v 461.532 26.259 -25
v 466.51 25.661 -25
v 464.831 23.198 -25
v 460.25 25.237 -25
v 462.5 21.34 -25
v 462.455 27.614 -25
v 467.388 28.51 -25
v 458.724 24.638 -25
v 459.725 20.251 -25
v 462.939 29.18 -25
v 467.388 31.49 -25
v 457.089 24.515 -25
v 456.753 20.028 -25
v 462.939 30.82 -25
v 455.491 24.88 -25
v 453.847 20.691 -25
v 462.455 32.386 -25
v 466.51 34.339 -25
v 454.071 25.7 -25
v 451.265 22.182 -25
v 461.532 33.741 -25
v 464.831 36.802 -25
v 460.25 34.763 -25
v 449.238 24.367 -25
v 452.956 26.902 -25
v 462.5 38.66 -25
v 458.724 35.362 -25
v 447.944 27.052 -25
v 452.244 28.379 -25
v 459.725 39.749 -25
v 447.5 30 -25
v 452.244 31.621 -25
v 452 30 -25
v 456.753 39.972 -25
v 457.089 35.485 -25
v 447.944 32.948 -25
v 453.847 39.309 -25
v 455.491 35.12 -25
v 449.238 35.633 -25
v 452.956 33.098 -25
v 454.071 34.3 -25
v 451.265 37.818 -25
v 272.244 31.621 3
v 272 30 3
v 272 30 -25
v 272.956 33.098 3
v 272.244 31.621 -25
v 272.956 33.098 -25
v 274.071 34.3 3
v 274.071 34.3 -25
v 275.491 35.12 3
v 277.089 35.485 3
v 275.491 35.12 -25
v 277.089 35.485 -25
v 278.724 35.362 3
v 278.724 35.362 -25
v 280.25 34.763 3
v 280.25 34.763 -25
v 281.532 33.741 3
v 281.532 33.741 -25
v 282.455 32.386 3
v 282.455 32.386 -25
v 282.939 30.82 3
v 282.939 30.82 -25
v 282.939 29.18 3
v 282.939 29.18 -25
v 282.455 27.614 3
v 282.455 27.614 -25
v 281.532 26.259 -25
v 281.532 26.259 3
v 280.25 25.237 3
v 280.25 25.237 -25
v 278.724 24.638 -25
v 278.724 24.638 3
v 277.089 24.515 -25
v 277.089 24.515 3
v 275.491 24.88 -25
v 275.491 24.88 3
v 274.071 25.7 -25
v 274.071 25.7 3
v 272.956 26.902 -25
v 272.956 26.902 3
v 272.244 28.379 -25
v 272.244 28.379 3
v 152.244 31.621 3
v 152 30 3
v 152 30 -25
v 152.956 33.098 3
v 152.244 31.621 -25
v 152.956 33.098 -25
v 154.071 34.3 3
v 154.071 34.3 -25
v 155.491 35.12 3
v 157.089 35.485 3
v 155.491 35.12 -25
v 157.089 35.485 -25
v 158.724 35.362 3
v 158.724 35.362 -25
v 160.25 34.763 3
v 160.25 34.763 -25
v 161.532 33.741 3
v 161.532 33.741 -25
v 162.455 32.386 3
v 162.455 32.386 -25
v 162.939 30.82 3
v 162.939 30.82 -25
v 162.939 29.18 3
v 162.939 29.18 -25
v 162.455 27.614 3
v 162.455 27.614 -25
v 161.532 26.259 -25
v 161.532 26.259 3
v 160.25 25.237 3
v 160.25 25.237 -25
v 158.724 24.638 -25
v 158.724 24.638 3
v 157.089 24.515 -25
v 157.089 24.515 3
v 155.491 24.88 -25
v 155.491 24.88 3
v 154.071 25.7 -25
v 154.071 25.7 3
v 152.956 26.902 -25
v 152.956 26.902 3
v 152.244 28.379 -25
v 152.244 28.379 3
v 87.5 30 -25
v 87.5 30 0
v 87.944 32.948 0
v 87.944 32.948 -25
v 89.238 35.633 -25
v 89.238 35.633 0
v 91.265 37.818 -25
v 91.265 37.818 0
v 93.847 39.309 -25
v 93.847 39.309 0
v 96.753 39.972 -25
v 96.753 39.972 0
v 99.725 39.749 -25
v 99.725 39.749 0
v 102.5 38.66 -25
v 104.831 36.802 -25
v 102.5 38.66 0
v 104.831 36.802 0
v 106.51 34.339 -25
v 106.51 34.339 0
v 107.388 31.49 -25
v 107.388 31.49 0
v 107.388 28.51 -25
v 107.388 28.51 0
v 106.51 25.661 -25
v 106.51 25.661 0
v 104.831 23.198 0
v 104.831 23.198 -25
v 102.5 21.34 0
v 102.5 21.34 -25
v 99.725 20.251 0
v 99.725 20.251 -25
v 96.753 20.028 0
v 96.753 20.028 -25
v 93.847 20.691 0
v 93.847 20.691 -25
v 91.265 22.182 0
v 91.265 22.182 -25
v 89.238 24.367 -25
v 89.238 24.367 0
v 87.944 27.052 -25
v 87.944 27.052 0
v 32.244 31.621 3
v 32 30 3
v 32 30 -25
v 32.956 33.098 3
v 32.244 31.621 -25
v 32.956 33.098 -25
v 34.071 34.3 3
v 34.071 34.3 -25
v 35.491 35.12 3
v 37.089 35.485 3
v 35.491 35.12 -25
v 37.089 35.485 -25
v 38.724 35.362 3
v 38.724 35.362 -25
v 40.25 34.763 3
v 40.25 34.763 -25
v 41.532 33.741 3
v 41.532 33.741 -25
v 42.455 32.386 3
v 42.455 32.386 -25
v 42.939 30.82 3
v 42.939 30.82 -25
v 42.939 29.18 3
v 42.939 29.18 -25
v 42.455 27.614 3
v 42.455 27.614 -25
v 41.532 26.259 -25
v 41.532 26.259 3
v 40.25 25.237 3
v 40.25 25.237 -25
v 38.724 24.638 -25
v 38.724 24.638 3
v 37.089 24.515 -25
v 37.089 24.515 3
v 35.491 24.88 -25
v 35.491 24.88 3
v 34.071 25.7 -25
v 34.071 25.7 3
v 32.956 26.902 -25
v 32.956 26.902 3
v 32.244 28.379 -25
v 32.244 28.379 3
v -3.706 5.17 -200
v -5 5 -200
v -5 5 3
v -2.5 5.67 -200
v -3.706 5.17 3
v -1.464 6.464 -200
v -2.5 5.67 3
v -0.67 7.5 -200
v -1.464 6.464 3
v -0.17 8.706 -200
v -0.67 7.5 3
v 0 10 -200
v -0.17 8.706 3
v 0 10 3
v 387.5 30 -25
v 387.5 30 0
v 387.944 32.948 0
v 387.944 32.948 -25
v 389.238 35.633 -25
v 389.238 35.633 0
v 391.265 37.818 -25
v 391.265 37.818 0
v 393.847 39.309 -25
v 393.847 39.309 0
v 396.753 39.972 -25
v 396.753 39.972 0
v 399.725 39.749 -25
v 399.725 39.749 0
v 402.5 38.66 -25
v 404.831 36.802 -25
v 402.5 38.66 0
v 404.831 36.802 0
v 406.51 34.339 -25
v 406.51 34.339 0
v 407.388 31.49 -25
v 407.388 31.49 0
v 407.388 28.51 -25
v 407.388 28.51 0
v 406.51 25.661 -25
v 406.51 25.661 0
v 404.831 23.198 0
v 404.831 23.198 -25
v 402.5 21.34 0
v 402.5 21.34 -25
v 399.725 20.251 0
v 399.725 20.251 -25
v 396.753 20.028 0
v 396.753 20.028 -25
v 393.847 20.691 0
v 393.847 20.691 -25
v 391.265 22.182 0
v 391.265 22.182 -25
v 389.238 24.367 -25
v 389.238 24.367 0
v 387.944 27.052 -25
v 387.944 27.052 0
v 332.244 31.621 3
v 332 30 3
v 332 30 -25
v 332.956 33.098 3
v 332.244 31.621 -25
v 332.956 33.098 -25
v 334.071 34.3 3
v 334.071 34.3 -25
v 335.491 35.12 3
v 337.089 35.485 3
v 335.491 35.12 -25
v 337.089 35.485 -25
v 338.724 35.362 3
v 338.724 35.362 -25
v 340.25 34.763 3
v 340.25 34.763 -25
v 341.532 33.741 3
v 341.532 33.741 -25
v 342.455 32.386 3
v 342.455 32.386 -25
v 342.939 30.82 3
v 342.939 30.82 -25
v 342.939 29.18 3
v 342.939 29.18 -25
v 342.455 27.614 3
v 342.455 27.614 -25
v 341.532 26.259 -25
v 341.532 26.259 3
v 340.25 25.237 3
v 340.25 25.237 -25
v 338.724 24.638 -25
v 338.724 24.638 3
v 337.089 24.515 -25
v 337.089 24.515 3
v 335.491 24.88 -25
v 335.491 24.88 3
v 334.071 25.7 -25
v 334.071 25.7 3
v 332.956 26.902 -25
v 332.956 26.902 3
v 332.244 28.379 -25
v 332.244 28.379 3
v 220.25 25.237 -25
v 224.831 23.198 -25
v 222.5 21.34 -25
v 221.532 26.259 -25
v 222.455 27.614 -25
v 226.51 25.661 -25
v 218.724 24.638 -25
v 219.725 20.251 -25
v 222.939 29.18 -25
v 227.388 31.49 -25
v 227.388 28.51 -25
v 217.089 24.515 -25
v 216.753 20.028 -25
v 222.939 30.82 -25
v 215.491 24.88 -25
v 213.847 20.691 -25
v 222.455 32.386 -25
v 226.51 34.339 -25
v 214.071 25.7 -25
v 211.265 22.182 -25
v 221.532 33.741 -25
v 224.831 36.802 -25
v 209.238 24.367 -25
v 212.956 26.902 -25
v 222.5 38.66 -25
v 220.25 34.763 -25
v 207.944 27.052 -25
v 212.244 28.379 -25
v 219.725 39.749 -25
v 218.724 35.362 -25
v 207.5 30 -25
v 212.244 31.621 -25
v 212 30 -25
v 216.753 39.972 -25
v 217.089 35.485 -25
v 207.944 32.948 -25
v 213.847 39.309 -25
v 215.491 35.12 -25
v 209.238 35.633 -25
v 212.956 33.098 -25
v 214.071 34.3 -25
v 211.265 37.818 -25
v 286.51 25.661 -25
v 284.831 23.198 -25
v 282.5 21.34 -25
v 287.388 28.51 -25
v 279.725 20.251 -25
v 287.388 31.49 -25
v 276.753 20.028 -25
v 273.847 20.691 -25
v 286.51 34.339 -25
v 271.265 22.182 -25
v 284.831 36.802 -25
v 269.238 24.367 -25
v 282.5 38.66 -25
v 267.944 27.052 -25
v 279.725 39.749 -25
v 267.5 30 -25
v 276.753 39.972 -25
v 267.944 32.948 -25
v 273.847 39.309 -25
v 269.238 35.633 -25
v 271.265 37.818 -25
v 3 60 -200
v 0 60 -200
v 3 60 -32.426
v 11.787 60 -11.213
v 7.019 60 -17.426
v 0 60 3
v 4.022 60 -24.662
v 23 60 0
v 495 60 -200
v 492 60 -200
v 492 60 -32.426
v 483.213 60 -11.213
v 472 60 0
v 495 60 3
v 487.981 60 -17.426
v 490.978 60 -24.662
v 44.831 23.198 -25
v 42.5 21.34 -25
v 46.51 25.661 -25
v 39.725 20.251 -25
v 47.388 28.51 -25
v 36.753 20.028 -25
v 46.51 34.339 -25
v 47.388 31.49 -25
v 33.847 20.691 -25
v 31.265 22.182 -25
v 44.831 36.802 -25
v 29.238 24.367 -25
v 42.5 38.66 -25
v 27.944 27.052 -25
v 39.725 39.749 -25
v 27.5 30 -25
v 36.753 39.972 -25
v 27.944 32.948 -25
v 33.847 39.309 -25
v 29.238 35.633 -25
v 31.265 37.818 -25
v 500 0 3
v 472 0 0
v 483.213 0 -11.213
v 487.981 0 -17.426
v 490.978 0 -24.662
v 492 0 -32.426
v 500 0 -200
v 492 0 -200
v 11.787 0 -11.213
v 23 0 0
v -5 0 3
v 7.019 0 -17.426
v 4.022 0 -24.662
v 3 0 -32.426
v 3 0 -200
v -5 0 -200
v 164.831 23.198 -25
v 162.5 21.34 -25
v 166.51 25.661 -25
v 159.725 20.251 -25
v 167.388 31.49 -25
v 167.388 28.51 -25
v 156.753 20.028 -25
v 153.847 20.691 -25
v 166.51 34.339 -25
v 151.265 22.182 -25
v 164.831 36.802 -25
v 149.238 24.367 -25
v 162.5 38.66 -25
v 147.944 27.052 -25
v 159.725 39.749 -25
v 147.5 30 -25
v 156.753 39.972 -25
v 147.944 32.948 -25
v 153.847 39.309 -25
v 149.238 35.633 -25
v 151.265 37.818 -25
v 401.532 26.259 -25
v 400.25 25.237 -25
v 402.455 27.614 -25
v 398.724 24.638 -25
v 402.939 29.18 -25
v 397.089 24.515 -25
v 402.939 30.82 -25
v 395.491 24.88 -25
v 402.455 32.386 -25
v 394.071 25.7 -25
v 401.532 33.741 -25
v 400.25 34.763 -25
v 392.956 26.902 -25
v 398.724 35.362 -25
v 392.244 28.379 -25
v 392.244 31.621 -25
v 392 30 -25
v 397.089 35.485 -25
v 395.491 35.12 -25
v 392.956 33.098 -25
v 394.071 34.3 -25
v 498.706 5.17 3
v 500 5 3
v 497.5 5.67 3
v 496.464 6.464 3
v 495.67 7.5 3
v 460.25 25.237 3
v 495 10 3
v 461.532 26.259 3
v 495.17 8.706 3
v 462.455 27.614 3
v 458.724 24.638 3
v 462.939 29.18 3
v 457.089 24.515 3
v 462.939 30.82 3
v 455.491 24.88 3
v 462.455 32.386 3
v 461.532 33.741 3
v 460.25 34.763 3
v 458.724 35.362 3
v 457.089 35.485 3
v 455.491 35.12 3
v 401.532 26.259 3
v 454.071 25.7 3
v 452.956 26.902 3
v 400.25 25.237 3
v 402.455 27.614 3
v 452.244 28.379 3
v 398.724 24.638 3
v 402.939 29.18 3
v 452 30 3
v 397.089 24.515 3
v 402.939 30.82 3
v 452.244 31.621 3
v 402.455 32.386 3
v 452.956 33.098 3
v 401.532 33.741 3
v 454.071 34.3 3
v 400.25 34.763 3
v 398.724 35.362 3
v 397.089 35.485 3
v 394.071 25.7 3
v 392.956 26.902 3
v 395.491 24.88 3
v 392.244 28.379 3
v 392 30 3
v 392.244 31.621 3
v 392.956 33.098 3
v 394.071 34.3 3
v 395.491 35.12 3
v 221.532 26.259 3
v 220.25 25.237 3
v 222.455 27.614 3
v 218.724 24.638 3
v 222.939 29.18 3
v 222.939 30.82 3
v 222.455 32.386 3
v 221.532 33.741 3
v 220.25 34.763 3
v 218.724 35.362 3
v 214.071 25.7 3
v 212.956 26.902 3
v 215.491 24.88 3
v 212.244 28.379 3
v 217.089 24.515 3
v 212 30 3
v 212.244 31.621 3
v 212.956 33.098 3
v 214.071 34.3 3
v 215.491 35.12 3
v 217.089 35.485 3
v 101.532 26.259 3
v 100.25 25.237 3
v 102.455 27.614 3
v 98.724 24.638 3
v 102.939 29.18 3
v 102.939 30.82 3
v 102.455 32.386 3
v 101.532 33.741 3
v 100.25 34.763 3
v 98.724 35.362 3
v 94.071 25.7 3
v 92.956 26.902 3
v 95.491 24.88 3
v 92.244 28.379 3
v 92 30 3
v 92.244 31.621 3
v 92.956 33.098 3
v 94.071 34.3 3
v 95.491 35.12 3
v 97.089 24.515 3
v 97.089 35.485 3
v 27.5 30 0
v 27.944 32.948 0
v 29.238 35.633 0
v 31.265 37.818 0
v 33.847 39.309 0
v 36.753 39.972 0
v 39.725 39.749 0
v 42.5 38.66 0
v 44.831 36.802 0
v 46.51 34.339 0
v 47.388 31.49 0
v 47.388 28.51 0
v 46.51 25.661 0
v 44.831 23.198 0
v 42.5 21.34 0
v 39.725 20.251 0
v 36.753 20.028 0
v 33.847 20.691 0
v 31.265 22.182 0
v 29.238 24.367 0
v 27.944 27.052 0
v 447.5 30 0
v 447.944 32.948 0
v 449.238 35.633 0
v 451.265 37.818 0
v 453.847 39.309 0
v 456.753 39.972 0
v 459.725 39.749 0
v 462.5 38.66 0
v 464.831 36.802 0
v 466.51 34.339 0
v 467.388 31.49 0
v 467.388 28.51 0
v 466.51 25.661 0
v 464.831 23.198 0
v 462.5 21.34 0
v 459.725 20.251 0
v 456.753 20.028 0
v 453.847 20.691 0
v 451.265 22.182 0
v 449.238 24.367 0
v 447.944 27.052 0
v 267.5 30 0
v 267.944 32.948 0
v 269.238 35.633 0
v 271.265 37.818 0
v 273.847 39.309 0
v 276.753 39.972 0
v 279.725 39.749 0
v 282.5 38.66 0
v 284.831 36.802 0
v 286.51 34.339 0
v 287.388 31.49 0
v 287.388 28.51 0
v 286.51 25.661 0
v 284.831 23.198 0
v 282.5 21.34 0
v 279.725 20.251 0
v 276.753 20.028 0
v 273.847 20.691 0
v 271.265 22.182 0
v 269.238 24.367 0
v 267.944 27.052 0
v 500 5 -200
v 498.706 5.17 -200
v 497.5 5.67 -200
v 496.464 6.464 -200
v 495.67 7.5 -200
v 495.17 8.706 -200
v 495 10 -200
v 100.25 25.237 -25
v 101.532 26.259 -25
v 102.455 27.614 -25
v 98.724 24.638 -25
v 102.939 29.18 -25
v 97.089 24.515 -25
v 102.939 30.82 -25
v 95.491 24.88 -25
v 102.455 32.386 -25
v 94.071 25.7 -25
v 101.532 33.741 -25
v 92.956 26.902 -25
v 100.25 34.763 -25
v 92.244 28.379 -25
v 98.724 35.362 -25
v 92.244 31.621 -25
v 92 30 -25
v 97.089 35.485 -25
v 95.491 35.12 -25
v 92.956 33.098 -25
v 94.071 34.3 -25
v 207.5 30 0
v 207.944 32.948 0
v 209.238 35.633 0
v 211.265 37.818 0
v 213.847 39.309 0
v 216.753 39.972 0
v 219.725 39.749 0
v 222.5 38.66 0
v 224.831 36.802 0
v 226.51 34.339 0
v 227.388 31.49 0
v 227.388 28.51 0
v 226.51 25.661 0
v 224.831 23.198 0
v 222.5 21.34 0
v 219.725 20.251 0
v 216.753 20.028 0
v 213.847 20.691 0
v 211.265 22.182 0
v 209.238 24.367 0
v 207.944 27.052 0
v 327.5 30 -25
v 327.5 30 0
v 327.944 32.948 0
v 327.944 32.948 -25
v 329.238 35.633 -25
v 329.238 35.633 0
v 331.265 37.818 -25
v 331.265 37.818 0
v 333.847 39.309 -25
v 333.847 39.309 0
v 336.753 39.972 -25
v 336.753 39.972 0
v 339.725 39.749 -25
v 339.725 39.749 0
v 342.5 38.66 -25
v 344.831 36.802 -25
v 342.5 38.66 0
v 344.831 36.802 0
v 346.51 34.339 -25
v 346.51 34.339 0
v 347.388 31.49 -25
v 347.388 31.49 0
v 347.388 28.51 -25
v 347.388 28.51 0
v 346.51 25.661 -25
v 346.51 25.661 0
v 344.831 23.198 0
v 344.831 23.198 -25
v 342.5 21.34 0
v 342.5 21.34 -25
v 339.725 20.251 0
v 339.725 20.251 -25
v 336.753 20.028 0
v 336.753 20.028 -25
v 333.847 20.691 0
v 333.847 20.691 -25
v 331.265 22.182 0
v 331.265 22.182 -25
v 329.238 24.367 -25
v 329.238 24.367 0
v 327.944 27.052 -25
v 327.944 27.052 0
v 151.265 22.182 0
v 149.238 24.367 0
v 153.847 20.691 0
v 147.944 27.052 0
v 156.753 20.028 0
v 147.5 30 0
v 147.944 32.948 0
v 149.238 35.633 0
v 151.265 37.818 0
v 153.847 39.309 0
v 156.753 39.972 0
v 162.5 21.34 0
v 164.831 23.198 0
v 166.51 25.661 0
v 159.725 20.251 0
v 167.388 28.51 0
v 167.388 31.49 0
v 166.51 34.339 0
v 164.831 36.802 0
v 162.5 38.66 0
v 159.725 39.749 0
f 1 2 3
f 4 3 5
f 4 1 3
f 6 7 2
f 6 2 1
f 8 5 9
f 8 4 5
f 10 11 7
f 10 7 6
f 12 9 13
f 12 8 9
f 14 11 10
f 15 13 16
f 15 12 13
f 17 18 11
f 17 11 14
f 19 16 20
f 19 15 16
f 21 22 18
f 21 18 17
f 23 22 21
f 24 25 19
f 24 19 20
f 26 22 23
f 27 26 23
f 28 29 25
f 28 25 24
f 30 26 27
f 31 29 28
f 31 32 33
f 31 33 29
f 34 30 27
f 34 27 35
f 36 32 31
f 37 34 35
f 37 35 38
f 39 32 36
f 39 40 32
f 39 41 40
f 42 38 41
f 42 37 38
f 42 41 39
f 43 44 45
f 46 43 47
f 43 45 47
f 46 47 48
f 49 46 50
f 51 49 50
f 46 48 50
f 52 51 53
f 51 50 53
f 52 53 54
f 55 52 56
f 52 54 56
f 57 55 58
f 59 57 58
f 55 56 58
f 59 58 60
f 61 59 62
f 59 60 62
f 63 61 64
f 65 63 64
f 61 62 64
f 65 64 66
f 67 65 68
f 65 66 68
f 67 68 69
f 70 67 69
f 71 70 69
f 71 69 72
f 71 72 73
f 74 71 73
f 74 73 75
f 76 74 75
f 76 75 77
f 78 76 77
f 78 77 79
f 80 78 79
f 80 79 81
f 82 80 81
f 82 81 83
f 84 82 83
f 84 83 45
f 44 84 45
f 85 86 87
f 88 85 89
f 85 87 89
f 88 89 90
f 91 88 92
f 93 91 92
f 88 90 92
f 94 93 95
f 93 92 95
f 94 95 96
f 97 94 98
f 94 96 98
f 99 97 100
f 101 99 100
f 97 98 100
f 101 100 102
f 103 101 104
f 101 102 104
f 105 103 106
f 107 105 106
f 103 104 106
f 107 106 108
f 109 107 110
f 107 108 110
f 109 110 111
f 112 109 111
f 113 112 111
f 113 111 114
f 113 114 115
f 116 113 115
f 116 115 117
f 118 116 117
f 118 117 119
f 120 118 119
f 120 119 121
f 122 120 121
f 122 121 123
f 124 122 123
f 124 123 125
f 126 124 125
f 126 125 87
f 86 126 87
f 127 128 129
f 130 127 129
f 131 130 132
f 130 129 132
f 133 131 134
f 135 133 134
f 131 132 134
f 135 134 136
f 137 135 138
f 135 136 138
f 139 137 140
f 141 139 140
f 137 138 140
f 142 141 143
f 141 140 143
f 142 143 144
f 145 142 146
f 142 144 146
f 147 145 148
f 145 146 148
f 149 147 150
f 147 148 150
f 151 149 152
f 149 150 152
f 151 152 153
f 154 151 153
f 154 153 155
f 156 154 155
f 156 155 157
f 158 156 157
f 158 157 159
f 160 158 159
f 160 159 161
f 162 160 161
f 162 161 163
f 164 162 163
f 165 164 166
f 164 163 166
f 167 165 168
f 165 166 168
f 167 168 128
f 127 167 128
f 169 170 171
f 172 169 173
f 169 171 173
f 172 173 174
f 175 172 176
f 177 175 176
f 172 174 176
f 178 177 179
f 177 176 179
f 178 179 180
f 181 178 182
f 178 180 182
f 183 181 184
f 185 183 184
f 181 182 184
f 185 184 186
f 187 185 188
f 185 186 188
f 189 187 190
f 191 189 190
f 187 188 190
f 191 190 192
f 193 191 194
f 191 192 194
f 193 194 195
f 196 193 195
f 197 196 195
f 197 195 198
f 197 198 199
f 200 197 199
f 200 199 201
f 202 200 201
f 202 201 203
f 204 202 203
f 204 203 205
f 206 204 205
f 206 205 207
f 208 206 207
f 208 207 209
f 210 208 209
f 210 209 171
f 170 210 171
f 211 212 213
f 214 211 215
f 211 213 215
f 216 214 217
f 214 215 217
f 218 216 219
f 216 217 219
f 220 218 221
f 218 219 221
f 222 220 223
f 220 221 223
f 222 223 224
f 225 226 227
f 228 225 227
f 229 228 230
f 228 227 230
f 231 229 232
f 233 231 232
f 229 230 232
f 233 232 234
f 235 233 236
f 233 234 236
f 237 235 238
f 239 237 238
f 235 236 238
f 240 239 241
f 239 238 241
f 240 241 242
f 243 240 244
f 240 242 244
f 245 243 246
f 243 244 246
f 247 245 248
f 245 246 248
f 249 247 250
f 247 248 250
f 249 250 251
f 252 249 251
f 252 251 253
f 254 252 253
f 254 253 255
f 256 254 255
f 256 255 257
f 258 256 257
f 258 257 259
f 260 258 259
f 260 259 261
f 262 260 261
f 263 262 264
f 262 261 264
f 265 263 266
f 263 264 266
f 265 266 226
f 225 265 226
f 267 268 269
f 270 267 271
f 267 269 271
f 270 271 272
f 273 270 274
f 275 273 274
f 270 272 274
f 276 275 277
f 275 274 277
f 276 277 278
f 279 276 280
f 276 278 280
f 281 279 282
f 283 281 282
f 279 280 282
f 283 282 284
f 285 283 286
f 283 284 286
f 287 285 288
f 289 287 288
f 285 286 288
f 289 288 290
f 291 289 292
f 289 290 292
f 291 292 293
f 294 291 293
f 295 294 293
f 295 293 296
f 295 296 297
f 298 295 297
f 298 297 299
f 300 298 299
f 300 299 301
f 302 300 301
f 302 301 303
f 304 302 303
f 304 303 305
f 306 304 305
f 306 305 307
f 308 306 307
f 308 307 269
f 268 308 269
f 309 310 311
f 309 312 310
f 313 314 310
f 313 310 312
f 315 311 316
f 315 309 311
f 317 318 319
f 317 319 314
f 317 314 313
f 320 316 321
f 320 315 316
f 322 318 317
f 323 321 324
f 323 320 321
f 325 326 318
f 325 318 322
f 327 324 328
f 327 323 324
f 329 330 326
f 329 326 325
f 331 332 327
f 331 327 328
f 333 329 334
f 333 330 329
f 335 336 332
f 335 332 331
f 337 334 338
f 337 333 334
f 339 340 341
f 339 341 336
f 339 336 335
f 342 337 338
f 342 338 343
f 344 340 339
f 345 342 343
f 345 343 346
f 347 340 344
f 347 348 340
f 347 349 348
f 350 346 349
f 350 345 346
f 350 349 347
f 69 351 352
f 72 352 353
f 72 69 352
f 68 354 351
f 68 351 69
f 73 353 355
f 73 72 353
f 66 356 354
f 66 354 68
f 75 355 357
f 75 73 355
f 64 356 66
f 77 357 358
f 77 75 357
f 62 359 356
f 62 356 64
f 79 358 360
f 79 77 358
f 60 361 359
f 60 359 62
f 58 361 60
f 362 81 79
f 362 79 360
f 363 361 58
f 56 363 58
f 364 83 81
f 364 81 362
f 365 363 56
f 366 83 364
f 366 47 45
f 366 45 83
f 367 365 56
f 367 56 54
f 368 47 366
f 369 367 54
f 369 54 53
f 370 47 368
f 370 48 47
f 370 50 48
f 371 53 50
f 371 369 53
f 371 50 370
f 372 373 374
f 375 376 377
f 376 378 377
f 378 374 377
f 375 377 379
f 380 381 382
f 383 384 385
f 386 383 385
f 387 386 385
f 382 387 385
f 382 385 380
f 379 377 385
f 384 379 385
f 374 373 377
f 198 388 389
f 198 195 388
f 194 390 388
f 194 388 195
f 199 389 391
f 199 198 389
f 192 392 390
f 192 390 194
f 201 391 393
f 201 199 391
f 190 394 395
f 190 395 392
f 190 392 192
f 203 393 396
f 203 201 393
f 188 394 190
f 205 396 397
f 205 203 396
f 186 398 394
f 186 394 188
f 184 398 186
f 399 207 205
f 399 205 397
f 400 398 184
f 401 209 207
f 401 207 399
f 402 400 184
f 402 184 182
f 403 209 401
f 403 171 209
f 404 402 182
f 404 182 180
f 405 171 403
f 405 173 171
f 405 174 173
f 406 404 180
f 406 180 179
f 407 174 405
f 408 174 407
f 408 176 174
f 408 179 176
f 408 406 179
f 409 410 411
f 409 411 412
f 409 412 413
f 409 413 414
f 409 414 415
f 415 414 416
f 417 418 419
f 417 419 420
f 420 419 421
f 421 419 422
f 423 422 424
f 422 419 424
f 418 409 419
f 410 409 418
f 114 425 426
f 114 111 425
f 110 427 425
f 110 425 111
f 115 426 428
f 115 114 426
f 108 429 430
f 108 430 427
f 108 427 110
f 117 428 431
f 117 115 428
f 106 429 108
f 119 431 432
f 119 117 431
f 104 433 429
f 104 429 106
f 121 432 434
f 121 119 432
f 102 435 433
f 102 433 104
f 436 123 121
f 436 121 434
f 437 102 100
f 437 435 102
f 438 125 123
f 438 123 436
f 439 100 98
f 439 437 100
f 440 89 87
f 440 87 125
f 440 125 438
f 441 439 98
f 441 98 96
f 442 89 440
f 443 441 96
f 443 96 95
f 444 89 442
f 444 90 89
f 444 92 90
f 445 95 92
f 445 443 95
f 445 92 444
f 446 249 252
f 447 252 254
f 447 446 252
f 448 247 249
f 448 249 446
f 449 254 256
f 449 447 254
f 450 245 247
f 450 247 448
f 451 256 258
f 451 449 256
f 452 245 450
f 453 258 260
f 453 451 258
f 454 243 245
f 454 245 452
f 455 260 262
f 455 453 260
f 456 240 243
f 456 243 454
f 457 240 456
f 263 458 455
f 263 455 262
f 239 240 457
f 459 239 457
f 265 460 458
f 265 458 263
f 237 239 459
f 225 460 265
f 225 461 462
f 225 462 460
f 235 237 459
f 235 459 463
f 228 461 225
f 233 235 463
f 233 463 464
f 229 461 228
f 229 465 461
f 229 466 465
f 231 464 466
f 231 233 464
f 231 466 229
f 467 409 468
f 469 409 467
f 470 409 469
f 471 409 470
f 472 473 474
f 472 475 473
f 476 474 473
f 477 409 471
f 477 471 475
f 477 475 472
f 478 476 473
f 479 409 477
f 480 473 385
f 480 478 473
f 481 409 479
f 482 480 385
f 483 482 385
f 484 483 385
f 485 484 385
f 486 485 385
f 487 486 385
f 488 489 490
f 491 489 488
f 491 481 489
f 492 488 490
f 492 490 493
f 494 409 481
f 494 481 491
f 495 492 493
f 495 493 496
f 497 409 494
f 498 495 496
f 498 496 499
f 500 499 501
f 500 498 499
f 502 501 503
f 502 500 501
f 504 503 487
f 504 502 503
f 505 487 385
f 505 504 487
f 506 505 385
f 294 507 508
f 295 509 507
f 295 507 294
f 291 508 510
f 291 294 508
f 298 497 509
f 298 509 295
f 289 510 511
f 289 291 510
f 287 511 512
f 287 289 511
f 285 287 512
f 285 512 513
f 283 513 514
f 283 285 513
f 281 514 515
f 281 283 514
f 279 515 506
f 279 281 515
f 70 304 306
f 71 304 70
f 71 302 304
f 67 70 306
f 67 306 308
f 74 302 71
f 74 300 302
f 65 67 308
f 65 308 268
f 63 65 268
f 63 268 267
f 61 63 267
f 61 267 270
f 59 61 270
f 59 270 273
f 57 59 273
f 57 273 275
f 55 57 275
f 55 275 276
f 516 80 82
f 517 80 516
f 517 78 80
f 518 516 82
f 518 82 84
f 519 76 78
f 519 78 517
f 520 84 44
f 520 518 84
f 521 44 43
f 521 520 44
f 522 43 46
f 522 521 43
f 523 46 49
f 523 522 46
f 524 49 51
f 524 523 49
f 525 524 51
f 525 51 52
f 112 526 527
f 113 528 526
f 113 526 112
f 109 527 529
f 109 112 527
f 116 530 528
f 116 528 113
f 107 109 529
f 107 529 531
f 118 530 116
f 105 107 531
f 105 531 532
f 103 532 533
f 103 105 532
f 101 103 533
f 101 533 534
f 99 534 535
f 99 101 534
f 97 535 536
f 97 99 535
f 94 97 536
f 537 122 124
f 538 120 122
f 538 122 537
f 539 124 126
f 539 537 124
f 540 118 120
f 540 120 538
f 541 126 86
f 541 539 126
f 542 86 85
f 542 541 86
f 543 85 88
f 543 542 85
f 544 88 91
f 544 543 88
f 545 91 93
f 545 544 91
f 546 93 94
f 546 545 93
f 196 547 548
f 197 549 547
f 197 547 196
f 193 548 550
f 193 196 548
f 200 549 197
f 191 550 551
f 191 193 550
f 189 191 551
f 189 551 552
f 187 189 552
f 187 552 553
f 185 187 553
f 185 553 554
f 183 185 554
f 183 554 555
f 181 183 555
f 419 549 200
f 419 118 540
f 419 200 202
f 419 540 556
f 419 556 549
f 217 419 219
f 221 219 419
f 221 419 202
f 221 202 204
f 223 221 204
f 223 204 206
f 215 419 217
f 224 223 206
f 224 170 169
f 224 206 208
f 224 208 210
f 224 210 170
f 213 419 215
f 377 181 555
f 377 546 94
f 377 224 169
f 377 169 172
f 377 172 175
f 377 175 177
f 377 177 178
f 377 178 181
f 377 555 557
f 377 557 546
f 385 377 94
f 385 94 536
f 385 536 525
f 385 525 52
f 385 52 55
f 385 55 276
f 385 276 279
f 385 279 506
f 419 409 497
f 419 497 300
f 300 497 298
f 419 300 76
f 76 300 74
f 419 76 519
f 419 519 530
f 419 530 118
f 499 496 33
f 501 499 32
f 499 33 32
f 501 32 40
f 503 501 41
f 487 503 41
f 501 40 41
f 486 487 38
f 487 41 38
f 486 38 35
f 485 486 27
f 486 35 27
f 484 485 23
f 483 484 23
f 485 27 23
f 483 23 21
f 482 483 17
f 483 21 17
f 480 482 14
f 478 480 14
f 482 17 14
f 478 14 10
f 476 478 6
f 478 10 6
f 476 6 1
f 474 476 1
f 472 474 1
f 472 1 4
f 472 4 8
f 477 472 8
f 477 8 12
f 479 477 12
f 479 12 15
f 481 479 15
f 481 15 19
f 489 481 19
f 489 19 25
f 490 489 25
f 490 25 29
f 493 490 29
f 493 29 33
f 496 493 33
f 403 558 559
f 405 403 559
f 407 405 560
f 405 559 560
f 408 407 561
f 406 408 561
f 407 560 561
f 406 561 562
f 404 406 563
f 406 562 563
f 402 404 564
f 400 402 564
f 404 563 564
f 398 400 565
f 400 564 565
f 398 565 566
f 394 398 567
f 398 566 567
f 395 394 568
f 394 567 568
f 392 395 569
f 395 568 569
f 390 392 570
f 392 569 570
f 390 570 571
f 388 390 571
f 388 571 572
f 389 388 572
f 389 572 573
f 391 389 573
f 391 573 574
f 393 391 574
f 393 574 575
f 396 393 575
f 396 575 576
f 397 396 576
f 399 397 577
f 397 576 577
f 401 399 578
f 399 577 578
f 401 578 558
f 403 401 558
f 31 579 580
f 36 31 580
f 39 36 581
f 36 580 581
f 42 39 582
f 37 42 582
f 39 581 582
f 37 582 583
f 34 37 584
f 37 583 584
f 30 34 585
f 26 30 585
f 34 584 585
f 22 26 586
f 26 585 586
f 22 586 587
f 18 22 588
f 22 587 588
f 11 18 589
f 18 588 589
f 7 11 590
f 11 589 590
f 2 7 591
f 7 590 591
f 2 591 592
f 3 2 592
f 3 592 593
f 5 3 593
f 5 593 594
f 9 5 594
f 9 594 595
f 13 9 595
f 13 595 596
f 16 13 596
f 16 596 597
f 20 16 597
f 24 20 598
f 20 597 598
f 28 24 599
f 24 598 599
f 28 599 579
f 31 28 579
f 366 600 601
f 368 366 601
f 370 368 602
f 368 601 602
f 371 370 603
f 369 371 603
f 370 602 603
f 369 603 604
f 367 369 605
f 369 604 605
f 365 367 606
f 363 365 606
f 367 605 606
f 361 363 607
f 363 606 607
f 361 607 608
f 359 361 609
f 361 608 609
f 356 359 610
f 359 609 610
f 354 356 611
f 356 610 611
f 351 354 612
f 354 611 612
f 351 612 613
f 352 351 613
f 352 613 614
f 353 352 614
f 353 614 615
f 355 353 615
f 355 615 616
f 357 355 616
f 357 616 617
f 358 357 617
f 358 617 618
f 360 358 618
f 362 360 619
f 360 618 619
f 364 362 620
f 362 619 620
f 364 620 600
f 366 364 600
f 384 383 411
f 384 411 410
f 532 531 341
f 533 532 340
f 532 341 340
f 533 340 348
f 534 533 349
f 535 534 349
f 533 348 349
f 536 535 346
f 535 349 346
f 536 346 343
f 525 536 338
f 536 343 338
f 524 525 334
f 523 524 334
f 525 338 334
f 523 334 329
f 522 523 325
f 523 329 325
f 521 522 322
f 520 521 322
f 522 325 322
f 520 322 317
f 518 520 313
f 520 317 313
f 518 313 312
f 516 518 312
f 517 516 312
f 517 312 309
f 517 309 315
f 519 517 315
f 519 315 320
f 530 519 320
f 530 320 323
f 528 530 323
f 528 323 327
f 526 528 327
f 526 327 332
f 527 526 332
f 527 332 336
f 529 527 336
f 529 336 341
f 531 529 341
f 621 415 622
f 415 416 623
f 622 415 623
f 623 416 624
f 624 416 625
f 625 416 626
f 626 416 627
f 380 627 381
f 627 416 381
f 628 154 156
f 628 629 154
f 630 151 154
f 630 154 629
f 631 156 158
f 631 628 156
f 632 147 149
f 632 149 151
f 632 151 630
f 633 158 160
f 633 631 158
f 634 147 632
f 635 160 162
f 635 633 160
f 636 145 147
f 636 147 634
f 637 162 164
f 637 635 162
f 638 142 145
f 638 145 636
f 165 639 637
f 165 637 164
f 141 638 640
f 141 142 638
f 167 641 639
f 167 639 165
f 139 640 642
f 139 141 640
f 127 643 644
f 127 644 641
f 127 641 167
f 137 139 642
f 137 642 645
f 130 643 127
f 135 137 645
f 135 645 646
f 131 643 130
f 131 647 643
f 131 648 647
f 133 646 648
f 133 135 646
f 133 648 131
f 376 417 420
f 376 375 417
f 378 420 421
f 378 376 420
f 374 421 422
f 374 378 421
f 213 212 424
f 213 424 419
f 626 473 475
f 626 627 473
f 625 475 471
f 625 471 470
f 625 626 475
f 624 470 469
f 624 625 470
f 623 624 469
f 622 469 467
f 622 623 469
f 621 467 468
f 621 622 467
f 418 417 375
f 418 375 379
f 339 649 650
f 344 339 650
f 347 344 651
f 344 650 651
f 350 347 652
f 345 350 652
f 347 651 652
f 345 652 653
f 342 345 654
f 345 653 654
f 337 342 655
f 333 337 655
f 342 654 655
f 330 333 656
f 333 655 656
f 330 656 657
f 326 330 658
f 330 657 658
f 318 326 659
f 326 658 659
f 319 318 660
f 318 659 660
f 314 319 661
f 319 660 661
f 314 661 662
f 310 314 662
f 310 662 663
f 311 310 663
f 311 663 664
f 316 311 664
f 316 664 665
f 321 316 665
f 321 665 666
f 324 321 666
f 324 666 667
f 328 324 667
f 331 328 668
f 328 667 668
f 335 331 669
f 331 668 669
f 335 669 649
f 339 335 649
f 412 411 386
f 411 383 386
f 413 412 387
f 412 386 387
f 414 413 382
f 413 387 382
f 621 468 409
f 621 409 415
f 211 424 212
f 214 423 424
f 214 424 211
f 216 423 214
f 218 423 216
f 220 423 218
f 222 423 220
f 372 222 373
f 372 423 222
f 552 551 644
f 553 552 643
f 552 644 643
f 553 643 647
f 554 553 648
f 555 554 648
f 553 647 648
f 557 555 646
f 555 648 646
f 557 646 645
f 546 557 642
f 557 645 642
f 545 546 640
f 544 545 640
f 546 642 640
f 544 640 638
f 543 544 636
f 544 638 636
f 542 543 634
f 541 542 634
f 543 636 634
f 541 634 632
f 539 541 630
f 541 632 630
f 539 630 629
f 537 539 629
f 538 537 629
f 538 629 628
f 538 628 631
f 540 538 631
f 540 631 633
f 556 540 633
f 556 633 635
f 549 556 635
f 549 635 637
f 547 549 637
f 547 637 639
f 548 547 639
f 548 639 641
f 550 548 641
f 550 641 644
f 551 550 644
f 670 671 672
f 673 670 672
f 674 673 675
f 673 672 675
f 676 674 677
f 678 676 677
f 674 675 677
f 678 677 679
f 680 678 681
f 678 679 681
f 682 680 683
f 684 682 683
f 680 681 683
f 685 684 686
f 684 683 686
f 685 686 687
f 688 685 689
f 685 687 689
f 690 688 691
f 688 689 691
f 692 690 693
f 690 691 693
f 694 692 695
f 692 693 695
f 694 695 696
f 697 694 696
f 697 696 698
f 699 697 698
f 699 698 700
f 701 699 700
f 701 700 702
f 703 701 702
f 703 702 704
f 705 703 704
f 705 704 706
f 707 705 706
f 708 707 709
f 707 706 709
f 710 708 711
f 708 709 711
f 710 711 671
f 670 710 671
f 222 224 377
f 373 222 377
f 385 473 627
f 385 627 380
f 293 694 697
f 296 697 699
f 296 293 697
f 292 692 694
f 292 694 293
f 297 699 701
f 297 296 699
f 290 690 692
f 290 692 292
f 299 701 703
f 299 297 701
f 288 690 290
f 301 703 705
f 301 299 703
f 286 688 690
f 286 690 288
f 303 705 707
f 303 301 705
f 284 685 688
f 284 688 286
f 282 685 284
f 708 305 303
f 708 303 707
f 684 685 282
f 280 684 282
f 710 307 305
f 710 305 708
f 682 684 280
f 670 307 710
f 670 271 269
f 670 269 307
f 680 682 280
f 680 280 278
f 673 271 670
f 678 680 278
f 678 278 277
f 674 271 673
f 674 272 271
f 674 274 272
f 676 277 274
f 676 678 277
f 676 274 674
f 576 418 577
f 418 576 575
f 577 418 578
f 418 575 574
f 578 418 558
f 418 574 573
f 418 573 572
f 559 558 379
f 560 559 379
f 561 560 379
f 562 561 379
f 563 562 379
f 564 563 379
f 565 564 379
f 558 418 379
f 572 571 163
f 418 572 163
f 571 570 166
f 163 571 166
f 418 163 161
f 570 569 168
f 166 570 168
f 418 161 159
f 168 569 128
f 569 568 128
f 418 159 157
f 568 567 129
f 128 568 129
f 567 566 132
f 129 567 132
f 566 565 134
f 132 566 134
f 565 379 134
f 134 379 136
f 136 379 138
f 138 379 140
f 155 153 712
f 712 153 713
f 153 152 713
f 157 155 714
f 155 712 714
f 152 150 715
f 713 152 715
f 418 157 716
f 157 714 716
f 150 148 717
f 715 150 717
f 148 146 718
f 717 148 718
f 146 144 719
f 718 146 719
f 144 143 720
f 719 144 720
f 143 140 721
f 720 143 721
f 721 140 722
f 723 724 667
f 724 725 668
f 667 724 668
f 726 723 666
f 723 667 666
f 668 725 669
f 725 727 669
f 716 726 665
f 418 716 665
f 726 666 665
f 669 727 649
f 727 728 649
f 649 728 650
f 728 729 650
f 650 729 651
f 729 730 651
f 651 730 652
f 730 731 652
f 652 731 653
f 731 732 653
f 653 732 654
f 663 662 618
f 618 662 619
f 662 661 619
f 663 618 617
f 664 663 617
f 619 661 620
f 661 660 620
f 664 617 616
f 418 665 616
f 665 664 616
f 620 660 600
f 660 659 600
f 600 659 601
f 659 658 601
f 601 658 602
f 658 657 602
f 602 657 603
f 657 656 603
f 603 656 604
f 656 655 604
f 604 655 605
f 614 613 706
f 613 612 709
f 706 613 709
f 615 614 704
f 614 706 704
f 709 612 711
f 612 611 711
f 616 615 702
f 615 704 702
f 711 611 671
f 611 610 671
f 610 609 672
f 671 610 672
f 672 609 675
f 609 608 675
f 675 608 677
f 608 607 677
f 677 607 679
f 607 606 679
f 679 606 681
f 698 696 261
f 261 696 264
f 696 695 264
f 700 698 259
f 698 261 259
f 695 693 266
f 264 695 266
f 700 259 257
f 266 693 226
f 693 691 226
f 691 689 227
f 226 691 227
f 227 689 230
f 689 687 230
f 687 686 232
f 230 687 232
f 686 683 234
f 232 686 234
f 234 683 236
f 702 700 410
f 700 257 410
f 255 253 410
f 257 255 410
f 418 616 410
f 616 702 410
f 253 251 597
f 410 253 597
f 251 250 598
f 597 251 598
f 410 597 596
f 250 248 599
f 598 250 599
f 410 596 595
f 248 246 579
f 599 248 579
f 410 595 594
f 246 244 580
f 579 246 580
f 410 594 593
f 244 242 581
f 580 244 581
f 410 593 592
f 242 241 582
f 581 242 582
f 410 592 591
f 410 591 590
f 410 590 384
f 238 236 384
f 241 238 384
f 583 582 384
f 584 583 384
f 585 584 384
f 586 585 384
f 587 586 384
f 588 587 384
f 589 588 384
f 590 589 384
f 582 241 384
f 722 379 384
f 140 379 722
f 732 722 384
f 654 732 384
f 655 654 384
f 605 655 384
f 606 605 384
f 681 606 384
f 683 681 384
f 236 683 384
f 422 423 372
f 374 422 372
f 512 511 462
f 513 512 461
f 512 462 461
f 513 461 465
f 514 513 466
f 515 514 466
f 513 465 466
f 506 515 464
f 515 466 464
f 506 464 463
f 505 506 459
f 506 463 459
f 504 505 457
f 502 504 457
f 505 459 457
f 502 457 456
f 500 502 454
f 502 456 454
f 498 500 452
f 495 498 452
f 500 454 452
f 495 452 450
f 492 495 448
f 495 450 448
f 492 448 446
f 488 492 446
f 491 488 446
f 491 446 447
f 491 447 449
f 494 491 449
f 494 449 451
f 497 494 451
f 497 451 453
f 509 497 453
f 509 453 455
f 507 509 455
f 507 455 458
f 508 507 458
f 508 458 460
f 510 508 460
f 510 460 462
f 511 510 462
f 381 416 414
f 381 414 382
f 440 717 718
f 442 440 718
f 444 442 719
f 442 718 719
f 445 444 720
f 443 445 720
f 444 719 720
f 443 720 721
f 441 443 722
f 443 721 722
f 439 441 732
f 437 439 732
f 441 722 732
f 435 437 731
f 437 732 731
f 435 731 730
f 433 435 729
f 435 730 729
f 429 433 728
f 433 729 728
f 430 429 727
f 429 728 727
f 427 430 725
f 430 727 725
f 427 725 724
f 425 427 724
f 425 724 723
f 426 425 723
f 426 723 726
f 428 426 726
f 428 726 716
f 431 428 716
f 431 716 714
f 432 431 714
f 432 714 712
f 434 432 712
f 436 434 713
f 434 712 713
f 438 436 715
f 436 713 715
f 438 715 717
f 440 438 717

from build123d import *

# Parameters (mm, degrees)
SKETCH_1_W             = 495
SKETCH_1_H             = 60
EXTRUDE_1_DEPTH        = 3
SKETCH_2_W             = 3
SKETCH_2_H             = 60
EXTRUDE_2_DEPTH        = 200
EXTRUDE_3_DEPTH        = 60
SKETCH_4_R             = 10
EXTRUDE_4_DEPTH        = 25
SKETCH_5_R             = 5.5
CUT_EXTRUDE_1_DEPTH    = 529.441103625
PATTERN_LINEAR_1_COUNT = 8
PATTERN_LINEAR_1_PITCH = 60
FILLET_1_R             = 30
SKETCH_6_W             = 203
SKETCH_6_H             = 5
EXTRUDE_5_DEPTH        = 5
SKETCH_7_W             = 203
SKETCH_7_H             = 5
EXTRUDE_6_DEPTH        = 5
FILLET_2_R             = 5
FILLET_3_R             = 5


with BuildPart() as part:
    # 草图1 → 凸台-拉伸1 (new body)
    with BuildSketch(Plane.XY):
        with Locations((247.5, 30)):
            Rectangle(SKETCH_1_W, SKETCH_1_H)
    extrude(amount=EXTRUDE_1_DEPTH)

    # 草图2 → 凸台-拉伸2 (add)
    with BuildSketch(Plane(origin=(0, 0, 0), x_dir=(-1, 0, 0), z_dir=(0, 0, -1))):
        with Locations((-493.5, 30)):
            Rectangle(SKETCH_2_W, SKETCH_2_H)
        with Locations((-1.5, 30)):
            Rectangle(SKETCH_2_W, SKETCH_2_H)
    extrude(amount=EXTRUDE_2_DEPTH)

    # 草图3 → 凸台-拉伸3 (add)
    with BuildSketch(Plane.XZ):
        Polygon((3, -20), (23, 0), (3, 0), align=None)
        Polygon((472, 0), (492, 0), (492, -20), align=None)
    extrude(amount=-EXTRUDE_3_DEPTH)

    # 草图4 → 凸台-拉伸4 (add)
    with BuildSketch(Plane(origin=(0, 0, 0), x_dir=(-1, 0, 0), z_dir=(0, 0, -1))):
        with Locations((-457.5, 30)):
            Circle(SKETCH_4_R)
    extrude_4 = extrude(amount=EXTRUDE_4_DEPTH)

    # 草图5 → 切除-拉伸1 (cut, through all)
    with BuildSketch(Plane(origin=(0, 0, -25), x_dir=(-1, 0, 0), z_dir=(0, 0, -1))):
        with Locations((-457.5, 30)):
            Circle(SKETCH_5_R)
    cut_extrude_1 = extrude(amount=-CUT_EXTRUDE_1_DEPTH, mode=Mode.SUBTRACT)

    # 阵列(线性)1: 凸台-拉伸4, 切除-拉伸1 ×8
    with Locations(*[(-i * PATTERN_LINEAR_1_PITCH, 0, 0) for i in range(1, PATTERN_LINEAR_1_COUNT)]):
        add(extrude_4)
        add(cut_extrude_1, mode=Mode.SUBTRACT)

    # 圆角1
    fillet_1_edges = [part.edges().sort_by_distance(p)[0] for p in [
        (3, 30, -20),
        (492, 30, -20),
    ]]
    fillet(fillet_1_edges, radius=FILLET_1_R)

    # 草图6 → 凸台-拉伸5 (add)
    with BuildSketch(Plane.ZY):
        with Locations((-98.5, 2.5)):
            Rectangle(SKETCH_6_W, SKETCH_6_H)
    extrude(amount=EXTRUDE_5_DEPTH)

    # 草图7 → 凸台-拉伸6 (add)
    with BuildSketch(Plane(origin=(495, 0, 0), x_dir=(0, 0, -1), z_dir=(1, 0, 0))):
        with Locations((98.5, 2.5)):
            Rectangle(SKETCH_7_W, SKETCH_7_H)
    extrude(amount=EXTRUDE_6_DEPTH)

    # 圆角2
    fillet_2_edges = [part.edges().sort_by_distance(p)[0] for p in [
        (0, 5, -98.5),
    ]]
    fillet(fillet_2_edges, radius=FILLET_2_R - 0.0001)  # a hair under: the kernel refuses the full size

    # 圆角3
    fillet_3_edges = [part.edges().sort_by_distance(p)[0] for p in [
        (495, 5, -98.5),
    ]]
    fillet(fillet_3_edges, radius=FILLET_3_R - 0.0001)  # a hair under: the kernel refuses the full size


solid = part.part
